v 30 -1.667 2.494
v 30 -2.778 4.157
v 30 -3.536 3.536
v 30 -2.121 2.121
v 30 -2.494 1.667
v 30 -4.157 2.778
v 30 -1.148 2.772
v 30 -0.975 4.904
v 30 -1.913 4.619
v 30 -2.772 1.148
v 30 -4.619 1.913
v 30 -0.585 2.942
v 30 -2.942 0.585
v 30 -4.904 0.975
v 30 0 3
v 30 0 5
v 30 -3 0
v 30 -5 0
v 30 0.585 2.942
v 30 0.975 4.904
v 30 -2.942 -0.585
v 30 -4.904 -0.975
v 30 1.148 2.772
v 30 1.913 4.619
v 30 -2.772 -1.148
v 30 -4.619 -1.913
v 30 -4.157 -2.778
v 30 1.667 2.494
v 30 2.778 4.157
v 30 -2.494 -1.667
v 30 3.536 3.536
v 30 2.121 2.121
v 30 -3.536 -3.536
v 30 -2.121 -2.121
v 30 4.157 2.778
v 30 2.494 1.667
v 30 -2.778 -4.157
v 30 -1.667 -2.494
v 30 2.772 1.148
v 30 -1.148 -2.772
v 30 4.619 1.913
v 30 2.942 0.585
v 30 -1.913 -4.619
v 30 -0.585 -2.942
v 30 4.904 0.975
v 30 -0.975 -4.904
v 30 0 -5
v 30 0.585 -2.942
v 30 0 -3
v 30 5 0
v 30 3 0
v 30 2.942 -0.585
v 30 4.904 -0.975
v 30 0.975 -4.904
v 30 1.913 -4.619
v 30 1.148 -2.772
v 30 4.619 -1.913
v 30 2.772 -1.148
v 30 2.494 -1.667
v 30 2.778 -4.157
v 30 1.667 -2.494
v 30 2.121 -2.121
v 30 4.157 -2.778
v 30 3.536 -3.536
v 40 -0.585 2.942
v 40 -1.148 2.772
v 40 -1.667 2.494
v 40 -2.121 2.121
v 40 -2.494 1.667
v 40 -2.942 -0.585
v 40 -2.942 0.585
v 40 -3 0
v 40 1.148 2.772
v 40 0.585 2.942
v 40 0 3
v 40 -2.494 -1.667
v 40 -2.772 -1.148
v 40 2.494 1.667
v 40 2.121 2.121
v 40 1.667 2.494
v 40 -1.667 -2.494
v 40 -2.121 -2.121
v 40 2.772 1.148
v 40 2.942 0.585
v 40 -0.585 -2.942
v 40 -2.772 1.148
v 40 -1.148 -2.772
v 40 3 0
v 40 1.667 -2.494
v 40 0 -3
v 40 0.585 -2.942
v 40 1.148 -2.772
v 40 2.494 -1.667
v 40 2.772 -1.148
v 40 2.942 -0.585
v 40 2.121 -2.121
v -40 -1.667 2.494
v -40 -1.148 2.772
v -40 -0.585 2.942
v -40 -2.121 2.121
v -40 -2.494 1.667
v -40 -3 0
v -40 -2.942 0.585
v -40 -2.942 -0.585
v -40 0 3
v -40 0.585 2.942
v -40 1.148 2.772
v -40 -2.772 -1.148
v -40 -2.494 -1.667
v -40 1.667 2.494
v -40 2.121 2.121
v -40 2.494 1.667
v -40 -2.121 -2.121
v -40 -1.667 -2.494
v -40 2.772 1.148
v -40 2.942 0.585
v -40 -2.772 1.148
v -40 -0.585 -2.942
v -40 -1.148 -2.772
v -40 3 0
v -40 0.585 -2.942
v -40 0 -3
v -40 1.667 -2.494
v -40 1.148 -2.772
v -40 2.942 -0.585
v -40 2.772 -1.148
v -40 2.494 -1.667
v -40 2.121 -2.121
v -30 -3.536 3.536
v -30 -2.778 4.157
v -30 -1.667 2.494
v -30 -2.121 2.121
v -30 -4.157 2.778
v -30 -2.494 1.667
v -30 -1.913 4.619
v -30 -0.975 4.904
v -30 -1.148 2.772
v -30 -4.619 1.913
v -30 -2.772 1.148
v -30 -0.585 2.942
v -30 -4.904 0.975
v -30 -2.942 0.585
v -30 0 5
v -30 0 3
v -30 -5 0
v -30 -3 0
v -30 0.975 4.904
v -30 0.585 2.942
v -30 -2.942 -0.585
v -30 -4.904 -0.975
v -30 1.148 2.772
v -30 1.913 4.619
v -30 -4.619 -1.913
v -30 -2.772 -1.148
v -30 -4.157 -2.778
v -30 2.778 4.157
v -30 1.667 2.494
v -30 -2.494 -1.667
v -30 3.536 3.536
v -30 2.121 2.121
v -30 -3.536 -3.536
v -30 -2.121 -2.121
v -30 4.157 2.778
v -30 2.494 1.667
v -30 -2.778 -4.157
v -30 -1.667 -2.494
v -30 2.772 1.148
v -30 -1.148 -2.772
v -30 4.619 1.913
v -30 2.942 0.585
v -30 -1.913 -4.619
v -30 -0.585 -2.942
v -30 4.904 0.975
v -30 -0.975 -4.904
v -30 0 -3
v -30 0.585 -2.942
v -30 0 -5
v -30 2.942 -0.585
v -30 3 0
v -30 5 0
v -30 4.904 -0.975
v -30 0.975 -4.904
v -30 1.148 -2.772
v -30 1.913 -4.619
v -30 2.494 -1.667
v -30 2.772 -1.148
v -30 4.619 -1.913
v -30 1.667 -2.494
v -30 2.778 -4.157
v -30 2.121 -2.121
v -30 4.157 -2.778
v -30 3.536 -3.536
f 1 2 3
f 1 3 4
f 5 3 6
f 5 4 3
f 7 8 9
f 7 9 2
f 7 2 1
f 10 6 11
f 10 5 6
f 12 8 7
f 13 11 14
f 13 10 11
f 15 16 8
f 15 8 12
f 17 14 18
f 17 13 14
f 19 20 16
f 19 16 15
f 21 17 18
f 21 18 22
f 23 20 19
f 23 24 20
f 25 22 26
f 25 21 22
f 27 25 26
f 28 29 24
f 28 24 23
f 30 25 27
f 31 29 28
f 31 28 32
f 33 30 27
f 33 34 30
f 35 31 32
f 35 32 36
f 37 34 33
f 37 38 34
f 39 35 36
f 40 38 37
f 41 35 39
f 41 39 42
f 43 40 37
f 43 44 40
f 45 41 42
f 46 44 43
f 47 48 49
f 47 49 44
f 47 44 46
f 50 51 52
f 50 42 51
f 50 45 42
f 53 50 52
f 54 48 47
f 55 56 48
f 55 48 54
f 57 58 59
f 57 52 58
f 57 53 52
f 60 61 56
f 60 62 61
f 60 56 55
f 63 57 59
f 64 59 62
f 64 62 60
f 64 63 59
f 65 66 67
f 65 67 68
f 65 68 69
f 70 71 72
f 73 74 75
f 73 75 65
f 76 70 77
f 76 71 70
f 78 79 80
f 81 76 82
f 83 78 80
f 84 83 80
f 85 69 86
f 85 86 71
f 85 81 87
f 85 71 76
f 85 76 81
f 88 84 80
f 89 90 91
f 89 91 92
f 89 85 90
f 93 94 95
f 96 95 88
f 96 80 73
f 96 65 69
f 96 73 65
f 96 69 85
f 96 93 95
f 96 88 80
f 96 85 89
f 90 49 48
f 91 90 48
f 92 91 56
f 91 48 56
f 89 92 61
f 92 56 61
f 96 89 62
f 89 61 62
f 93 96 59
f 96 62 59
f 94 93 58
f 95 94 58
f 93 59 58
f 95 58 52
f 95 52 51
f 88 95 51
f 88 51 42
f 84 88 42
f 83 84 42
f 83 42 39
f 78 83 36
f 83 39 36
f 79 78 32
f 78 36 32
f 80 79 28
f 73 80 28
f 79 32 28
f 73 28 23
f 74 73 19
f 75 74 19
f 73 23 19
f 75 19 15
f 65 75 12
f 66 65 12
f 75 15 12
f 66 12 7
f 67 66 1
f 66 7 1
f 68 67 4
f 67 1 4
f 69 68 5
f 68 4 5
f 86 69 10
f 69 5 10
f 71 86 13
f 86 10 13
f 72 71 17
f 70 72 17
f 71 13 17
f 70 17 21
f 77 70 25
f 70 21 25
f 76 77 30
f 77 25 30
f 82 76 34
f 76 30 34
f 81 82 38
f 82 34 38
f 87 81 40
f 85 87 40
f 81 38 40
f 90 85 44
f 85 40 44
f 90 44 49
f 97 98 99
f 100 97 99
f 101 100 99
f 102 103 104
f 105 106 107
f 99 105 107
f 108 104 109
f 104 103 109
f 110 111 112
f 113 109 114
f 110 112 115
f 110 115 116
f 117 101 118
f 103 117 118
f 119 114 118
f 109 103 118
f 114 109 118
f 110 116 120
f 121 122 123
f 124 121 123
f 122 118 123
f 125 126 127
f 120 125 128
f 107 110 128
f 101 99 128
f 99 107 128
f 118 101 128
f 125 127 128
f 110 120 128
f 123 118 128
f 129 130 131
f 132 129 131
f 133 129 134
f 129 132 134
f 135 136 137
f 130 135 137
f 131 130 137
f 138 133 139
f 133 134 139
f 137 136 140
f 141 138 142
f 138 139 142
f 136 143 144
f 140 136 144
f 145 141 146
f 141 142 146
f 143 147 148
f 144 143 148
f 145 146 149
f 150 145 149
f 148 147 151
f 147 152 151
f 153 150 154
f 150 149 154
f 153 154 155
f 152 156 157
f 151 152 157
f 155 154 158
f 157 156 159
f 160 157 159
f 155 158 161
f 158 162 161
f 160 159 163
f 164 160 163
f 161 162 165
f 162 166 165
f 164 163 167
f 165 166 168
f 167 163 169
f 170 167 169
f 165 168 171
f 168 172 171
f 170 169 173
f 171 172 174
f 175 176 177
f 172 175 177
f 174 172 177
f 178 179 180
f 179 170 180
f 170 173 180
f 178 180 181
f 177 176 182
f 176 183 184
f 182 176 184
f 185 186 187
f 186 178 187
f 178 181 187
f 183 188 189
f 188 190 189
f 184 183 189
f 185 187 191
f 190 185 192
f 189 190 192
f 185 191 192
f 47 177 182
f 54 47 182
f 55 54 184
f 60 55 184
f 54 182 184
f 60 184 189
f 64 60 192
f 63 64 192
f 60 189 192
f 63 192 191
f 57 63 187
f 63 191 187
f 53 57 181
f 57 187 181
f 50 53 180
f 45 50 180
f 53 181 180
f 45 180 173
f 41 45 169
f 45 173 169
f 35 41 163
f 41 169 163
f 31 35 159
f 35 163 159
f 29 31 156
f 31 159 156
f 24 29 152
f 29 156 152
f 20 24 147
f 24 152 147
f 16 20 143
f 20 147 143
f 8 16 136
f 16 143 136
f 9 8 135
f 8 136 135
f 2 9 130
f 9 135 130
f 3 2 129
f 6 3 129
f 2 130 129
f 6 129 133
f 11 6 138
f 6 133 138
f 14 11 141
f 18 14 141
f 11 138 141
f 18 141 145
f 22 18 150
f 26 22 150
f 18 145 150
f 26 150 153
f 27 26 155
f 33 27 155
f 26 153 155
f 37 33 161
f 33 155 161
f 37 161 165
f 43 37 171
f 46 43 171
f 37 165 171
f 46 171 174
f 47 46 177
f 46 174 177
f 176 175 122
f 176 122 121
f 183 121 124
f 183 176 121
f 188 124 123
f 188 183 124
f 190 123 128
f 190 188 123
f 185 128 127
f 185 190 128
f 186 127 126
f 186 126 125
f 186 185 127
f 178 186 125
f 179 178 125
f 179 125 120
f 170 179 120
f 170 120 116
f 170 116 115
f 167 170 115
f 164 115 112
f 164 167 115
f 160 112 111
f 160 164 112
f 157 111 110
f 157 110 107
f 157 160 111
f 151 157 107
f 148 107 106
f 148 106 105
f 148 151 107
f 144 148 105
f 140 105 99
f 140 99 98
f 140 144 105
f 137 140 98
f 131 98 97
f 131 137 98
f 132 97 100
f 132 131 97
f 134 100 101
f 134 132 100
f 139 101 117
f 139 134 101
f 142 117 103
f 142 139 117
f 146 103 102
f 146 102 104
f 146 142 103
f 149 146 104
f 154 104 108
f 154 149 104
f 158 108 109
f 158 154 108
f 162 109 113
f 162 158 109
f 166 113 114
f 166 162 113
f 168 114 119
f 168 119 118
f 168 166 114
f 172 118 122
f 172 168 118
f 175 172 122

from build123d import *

# Parameters (mm, degrees)
BOSS_EXTRUDE1_DEPTH      = 30
BOSS_EXTRUDE1_DEPTH_BACK = 30
SKETCH1_R                = 5
SKETCH2_R                = 3
BOSS_EXTRUDE2_DEPTH      = 10


with BuildPart() as part:
    # Sketch1 → Boss-Extrude1 (new, two sides: drawn at the far end of the back side and taken through both)
    with BuildSketch(Plane(origin=(0, 0, 0), x_dir=(0, 0, -1), z_dir=(1, 0, 0)).offset(-BOSS_EXTRUDE1_DEPTH_BACK)):
        Circle(SKETCH1_R)
    extrude(amount=BOSS_EXTRUDE1_DEPTH + BOSS_EXTRUDE1_DEPTH_BACK)

    # Sketch2 → Boss-Extrude2 (add)
    with BuildSketch(Plane(origin=(30, 0, 0), x_dir=(0, 0, -1), z_dir=(1, 0, 0))):
        Circle(SKETCH2_R)
    boss_extrude2 = extrude(amount=BOSS_EXTRUDE2_DEPTH)

    # Mirror1: Boss-Extrude2 across plane
    add(boss_extrude2.mirror(Plane(origin=(0, 0, 0), x_dir=(0, 0, 1), z_dir=(1, 0, 0))))


solid = part.part
